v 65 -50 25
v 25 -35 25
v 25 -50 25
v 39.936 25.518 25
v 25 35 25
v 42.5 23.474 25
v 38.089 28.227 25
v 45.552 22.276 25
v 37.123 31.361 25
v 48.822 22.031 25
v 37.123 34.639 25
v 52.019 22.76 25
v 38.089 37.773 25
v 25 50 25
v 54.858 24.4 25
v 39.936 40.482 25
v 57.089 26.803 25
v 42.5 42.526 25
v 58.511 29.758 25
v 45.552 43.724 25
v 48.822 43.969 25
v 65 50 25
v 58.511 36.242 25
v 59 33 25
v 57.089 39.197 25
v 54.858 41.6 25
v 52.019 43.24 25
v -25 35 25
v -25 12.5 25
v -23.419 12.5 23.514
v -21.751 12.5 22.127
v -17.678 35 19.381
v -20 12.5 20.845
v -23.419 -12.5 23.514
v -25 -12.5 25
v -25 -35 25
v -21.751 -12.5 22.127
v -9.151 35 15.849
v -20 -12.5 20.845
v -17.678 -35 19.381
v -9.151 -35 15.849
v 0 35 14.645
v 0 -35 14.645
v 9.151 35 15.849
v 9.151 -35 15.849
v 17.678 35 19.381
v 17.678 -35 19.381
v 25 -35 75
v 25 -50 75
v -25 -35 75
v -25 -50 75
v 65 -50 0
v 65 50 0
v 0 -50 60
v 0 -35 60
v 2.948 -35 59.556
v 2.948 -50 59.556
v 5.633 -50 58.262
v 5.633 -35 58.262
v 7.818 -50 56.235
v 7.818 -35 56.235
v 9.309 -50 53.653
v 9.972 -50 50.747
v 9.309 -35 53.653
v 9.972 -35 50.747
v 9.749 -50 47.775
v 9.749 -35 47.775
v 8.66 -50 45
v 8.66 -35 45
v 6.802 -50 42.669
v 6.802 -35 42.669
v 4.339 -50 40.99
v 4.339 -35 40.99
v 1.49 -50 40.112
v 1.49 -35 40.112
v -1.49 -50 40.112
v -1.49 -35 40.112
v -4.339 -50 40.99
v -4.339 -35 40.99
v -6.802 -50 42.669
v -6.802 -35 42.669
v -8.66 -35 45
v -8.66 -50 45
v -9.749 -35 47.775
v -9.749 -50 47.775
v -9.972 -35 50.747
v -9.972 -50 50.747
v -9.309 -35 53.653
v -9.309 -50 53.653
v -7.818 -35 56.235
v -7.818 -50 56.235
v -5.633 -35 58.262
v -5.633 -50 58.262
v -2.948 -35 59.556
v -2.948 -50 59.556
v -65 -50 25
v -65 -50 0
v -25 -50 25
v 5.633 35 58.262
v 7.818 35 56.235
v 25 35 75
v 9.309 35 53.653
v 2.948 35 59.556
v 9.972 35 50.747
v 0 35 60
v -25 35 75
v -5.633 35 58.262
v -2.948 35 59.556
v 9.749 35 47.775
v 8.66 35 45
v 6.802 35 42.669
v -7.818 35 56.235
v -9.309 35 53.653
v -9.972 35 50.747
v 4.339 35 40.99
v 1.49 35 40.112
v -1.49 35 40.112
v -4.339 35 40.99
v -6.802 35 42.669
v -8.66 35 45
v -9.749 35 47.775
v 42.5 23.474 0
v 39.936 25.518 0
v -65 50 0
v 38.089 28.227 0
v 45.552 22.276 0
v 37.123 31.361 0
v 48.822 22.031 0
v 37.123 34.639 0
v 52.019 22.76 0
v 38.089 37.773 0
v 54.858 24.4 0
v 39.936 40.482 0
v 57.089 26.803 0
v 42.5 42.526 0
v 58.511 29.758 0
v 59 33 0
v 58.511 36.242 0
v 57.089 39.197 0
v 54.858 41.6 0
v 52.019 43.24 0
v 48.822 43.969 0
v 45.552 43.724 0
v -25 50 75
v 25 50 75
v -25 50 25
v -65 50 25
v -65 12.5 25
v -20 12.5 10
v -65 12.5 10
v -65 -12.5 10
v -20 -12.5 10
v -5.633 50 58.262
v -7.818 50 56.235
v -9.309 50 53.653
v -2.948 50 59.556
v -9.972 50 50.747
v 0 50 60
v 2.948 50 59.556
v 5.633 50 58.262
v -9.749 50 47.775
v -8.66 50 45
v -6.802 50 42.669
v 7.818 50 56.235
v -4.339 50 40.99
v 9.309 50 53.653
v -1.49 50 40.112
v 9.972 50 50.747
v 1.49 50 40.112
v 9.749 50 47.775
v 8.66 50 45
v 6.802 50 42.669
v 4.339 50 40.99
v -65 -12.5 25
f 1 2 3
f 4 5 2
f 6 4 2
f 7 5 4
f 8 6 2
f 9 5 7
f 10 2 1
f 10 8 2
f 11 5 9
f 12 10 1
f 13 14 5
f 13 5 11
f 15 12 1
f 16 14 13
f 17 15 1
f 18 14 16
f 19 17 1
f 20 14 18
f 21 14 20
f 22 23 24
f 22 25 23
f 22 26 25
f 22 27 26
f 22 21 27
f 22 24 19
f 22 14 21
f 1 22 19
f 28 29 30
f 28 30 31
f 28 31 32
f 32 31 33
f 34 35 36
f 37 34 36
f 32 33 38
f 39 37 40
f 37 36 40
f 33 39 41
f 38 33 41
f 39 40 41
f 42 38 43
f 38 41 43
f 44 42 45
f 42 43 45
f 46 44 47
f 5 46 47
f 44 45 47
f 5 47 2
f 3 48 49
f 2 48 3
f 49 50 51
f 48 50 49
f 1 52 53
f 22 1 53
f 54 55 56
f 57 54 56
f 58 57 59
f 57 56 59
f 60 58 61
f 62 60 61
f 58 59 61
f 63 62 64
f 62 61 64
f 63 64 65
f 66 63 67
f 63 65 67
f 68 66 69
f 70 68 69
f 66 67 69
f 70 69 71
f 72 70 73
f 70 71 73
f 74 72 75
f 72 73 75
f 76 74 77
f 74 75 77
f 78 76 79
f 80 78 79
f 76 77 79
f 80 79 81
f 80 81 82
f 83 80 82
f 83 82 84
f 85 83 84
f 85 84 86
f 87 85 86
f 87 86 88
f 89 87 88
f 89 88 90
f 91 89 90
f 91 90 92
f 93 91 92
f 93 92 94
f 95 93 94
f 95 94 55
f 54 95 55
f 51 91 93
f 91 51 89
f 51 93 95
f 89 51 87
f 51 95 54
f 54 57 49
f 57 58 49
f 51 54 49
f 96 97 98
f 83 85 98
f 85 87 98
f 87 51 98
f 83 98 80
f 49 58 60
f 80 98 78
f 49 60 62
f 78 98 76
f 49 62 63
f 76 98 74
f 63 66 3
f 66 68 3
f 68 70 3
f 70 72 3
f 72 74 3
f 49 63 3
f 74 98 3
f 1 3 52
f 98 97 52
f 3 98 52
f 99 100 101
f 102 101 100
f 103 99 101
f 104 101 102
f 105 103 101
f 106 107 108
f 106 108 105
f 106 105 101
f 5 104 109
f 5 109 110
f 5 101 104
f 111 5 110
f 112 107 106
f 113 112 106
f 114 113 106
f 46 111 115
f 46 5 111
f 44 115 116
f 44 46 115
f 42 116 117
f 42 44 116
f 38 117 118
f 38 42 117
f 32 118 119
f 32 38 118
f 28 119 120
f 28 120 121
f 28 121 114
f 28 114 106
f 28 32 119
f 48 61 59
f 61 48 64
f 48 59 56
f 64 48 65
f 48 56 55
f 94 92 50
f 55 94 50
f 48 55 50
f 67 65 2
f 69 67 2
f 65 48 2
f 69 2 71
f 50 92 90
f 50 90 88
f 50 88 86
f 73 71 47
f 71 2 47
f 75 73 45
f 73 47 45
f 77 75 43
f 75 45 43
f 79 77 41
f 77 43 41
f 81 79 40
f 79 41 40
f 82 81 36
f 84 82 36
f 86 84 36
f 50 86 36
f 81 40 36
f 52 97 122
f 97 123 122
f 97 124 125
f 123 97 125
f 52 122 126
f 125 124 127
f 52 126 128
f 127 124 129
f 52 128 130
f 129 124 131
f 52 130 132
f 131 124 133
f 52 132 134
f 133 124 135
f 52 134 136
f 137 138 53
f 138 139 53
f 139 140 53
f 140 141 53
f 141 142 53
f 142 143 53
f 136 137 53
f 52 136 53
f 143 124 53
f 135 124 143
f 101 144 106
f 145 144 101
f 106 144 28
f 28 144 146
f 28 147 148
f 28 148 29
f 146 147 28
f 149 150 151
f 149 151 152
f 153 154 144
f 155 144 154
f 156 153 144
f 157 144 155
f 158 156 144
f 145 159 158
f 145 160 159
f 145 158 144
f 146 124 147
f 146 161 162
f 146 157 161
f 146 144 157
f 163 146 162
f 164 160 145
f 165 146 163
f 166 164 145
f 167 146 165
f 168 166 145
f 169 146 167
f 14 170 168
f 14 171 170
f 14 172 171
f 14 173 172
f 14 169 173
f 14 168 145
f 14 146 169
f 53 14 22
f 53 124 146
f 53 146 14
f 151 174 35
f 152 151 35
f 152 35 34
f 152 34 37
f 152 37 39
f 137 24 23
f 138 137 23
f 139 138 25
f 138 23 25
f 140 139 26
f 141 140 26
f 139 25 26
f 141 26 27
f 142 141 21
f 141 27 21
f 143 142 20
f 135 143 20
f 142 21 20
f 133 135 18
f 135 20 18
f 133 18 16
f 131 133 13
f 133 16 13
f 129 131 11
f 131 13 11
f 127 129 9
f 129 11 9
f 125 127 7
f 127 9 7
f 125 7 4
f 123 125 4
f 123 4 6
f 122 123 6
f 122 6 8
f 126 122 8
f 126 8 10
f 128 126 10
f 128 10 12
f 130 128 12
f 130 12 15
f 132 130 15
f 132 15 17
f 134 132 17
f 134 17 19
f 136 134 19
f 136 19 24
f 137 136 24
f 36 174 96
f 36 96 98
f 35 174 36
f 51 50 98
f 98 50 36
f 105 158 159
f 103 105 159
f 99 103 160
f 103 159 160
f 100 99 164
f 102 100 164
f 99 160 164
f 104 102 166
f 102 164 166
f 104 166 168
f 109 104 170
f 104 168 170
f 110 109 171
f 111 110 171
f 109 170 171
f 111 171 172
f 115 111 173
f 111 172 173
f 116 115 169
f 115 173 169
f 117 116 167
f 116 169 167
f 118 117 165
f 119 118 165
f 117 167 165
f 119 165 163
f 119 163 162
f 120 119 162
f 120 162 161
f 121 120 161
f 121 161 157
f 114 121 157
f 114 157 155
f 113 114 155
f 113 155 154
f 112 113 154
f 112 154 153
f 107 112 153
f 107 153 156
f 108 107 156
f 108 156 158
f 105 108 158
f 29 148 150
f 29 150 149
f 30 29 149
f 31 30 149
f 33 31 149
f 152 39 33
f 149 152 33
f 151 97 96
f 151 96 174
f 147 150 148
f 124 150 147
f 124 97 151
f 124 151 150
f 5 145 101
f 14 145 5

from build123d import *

# Parameters (mm, degrees)
SKETCH_1_W          = 130
SKETCH_1_H          = 100
EXTRUDE_1_DEPTH     = 25
SKETCH_2_W          = 50
SKETCH_2_H          = 50
SKETCH_2_R          = 10
EXTRUDE_2_DEPTH     = 100
SKETCH_3_R          = 11
CUT_EXTRUDE_1_DEPTH = 97.046863561
SKETCH_4_R          = 35.355339059
CUT_EXTRUDE_2_DEPTH = 35
SKETCH_5_W          = 45
SKETCH_5_H          = 25
CUT_EXTRUDE_3_DEPTH = 15


with BuildPart() as part:
    # Эскиз1 → Бобышка-Вытянуть1 (new body)
    with BuildSketch(Plane.XY):
        Rectangle(SKETCH_1_W, SKETCH_1_H)
    extrude(amount=EXTRUDE_1_DEPTH)

    # Эскиз2 → Бобышка-Вытянуть2 (add)
    with BuildSketch(Plane(origin=(0, 50, 0), x_dir=(1, 0, 0), z_dir=(0, 1, 0))):
        with Locations((0, -50)):
            Rectangle(SKETCH_2_W, SKETCH_2_H)
        with Locations(Location((0, -50, 0), (0, 0, 270))):
            Circle(SKETCH_2_R, mode=Mode.SUBTRACT)
    extrude(amount=-EXTRUDE_2_DEPTH)

    # Эскиз3 → Вырез-Вытянуть1 (cut, through all)
    with BuildSketch(Plane.XY.offset(25)):
        with Locations((48, 33)):
            Circle(SKETCH_3_R)
    extrude(amount=-CUT_EXTRUDE_1_DEPTH, mode=Mode.SUBTRACT)

    # Эскиз4 → Вырез-Вытянуть2 (cut, symmetric)
    with BuildSketch(Plane(origin=(0, 0, 0), x_dir=(-1, 0, 0), z_dir=(0, -1, 0))):
        with Locations((0, -50)):
            Circle(SKETCH_4_R)
    extrude(amount=CUT_EXTRUDE_2_DEPTH, both=True, mode=Mode.SUBTRACT)

    # Эскиз5 → Вырез-Вытянуть3 (cut)
    with BuildSketch(Plane.XY.offset(25)):
        with Locations((-42.5, 0)):
            Rectangle(SKETCH_5_W, SKETCH_5_H)
    extrude(amount=-CUT_EXTRUDE_3_DEPTH, mode=Mode.SUBTRACT)


solid = part.part
